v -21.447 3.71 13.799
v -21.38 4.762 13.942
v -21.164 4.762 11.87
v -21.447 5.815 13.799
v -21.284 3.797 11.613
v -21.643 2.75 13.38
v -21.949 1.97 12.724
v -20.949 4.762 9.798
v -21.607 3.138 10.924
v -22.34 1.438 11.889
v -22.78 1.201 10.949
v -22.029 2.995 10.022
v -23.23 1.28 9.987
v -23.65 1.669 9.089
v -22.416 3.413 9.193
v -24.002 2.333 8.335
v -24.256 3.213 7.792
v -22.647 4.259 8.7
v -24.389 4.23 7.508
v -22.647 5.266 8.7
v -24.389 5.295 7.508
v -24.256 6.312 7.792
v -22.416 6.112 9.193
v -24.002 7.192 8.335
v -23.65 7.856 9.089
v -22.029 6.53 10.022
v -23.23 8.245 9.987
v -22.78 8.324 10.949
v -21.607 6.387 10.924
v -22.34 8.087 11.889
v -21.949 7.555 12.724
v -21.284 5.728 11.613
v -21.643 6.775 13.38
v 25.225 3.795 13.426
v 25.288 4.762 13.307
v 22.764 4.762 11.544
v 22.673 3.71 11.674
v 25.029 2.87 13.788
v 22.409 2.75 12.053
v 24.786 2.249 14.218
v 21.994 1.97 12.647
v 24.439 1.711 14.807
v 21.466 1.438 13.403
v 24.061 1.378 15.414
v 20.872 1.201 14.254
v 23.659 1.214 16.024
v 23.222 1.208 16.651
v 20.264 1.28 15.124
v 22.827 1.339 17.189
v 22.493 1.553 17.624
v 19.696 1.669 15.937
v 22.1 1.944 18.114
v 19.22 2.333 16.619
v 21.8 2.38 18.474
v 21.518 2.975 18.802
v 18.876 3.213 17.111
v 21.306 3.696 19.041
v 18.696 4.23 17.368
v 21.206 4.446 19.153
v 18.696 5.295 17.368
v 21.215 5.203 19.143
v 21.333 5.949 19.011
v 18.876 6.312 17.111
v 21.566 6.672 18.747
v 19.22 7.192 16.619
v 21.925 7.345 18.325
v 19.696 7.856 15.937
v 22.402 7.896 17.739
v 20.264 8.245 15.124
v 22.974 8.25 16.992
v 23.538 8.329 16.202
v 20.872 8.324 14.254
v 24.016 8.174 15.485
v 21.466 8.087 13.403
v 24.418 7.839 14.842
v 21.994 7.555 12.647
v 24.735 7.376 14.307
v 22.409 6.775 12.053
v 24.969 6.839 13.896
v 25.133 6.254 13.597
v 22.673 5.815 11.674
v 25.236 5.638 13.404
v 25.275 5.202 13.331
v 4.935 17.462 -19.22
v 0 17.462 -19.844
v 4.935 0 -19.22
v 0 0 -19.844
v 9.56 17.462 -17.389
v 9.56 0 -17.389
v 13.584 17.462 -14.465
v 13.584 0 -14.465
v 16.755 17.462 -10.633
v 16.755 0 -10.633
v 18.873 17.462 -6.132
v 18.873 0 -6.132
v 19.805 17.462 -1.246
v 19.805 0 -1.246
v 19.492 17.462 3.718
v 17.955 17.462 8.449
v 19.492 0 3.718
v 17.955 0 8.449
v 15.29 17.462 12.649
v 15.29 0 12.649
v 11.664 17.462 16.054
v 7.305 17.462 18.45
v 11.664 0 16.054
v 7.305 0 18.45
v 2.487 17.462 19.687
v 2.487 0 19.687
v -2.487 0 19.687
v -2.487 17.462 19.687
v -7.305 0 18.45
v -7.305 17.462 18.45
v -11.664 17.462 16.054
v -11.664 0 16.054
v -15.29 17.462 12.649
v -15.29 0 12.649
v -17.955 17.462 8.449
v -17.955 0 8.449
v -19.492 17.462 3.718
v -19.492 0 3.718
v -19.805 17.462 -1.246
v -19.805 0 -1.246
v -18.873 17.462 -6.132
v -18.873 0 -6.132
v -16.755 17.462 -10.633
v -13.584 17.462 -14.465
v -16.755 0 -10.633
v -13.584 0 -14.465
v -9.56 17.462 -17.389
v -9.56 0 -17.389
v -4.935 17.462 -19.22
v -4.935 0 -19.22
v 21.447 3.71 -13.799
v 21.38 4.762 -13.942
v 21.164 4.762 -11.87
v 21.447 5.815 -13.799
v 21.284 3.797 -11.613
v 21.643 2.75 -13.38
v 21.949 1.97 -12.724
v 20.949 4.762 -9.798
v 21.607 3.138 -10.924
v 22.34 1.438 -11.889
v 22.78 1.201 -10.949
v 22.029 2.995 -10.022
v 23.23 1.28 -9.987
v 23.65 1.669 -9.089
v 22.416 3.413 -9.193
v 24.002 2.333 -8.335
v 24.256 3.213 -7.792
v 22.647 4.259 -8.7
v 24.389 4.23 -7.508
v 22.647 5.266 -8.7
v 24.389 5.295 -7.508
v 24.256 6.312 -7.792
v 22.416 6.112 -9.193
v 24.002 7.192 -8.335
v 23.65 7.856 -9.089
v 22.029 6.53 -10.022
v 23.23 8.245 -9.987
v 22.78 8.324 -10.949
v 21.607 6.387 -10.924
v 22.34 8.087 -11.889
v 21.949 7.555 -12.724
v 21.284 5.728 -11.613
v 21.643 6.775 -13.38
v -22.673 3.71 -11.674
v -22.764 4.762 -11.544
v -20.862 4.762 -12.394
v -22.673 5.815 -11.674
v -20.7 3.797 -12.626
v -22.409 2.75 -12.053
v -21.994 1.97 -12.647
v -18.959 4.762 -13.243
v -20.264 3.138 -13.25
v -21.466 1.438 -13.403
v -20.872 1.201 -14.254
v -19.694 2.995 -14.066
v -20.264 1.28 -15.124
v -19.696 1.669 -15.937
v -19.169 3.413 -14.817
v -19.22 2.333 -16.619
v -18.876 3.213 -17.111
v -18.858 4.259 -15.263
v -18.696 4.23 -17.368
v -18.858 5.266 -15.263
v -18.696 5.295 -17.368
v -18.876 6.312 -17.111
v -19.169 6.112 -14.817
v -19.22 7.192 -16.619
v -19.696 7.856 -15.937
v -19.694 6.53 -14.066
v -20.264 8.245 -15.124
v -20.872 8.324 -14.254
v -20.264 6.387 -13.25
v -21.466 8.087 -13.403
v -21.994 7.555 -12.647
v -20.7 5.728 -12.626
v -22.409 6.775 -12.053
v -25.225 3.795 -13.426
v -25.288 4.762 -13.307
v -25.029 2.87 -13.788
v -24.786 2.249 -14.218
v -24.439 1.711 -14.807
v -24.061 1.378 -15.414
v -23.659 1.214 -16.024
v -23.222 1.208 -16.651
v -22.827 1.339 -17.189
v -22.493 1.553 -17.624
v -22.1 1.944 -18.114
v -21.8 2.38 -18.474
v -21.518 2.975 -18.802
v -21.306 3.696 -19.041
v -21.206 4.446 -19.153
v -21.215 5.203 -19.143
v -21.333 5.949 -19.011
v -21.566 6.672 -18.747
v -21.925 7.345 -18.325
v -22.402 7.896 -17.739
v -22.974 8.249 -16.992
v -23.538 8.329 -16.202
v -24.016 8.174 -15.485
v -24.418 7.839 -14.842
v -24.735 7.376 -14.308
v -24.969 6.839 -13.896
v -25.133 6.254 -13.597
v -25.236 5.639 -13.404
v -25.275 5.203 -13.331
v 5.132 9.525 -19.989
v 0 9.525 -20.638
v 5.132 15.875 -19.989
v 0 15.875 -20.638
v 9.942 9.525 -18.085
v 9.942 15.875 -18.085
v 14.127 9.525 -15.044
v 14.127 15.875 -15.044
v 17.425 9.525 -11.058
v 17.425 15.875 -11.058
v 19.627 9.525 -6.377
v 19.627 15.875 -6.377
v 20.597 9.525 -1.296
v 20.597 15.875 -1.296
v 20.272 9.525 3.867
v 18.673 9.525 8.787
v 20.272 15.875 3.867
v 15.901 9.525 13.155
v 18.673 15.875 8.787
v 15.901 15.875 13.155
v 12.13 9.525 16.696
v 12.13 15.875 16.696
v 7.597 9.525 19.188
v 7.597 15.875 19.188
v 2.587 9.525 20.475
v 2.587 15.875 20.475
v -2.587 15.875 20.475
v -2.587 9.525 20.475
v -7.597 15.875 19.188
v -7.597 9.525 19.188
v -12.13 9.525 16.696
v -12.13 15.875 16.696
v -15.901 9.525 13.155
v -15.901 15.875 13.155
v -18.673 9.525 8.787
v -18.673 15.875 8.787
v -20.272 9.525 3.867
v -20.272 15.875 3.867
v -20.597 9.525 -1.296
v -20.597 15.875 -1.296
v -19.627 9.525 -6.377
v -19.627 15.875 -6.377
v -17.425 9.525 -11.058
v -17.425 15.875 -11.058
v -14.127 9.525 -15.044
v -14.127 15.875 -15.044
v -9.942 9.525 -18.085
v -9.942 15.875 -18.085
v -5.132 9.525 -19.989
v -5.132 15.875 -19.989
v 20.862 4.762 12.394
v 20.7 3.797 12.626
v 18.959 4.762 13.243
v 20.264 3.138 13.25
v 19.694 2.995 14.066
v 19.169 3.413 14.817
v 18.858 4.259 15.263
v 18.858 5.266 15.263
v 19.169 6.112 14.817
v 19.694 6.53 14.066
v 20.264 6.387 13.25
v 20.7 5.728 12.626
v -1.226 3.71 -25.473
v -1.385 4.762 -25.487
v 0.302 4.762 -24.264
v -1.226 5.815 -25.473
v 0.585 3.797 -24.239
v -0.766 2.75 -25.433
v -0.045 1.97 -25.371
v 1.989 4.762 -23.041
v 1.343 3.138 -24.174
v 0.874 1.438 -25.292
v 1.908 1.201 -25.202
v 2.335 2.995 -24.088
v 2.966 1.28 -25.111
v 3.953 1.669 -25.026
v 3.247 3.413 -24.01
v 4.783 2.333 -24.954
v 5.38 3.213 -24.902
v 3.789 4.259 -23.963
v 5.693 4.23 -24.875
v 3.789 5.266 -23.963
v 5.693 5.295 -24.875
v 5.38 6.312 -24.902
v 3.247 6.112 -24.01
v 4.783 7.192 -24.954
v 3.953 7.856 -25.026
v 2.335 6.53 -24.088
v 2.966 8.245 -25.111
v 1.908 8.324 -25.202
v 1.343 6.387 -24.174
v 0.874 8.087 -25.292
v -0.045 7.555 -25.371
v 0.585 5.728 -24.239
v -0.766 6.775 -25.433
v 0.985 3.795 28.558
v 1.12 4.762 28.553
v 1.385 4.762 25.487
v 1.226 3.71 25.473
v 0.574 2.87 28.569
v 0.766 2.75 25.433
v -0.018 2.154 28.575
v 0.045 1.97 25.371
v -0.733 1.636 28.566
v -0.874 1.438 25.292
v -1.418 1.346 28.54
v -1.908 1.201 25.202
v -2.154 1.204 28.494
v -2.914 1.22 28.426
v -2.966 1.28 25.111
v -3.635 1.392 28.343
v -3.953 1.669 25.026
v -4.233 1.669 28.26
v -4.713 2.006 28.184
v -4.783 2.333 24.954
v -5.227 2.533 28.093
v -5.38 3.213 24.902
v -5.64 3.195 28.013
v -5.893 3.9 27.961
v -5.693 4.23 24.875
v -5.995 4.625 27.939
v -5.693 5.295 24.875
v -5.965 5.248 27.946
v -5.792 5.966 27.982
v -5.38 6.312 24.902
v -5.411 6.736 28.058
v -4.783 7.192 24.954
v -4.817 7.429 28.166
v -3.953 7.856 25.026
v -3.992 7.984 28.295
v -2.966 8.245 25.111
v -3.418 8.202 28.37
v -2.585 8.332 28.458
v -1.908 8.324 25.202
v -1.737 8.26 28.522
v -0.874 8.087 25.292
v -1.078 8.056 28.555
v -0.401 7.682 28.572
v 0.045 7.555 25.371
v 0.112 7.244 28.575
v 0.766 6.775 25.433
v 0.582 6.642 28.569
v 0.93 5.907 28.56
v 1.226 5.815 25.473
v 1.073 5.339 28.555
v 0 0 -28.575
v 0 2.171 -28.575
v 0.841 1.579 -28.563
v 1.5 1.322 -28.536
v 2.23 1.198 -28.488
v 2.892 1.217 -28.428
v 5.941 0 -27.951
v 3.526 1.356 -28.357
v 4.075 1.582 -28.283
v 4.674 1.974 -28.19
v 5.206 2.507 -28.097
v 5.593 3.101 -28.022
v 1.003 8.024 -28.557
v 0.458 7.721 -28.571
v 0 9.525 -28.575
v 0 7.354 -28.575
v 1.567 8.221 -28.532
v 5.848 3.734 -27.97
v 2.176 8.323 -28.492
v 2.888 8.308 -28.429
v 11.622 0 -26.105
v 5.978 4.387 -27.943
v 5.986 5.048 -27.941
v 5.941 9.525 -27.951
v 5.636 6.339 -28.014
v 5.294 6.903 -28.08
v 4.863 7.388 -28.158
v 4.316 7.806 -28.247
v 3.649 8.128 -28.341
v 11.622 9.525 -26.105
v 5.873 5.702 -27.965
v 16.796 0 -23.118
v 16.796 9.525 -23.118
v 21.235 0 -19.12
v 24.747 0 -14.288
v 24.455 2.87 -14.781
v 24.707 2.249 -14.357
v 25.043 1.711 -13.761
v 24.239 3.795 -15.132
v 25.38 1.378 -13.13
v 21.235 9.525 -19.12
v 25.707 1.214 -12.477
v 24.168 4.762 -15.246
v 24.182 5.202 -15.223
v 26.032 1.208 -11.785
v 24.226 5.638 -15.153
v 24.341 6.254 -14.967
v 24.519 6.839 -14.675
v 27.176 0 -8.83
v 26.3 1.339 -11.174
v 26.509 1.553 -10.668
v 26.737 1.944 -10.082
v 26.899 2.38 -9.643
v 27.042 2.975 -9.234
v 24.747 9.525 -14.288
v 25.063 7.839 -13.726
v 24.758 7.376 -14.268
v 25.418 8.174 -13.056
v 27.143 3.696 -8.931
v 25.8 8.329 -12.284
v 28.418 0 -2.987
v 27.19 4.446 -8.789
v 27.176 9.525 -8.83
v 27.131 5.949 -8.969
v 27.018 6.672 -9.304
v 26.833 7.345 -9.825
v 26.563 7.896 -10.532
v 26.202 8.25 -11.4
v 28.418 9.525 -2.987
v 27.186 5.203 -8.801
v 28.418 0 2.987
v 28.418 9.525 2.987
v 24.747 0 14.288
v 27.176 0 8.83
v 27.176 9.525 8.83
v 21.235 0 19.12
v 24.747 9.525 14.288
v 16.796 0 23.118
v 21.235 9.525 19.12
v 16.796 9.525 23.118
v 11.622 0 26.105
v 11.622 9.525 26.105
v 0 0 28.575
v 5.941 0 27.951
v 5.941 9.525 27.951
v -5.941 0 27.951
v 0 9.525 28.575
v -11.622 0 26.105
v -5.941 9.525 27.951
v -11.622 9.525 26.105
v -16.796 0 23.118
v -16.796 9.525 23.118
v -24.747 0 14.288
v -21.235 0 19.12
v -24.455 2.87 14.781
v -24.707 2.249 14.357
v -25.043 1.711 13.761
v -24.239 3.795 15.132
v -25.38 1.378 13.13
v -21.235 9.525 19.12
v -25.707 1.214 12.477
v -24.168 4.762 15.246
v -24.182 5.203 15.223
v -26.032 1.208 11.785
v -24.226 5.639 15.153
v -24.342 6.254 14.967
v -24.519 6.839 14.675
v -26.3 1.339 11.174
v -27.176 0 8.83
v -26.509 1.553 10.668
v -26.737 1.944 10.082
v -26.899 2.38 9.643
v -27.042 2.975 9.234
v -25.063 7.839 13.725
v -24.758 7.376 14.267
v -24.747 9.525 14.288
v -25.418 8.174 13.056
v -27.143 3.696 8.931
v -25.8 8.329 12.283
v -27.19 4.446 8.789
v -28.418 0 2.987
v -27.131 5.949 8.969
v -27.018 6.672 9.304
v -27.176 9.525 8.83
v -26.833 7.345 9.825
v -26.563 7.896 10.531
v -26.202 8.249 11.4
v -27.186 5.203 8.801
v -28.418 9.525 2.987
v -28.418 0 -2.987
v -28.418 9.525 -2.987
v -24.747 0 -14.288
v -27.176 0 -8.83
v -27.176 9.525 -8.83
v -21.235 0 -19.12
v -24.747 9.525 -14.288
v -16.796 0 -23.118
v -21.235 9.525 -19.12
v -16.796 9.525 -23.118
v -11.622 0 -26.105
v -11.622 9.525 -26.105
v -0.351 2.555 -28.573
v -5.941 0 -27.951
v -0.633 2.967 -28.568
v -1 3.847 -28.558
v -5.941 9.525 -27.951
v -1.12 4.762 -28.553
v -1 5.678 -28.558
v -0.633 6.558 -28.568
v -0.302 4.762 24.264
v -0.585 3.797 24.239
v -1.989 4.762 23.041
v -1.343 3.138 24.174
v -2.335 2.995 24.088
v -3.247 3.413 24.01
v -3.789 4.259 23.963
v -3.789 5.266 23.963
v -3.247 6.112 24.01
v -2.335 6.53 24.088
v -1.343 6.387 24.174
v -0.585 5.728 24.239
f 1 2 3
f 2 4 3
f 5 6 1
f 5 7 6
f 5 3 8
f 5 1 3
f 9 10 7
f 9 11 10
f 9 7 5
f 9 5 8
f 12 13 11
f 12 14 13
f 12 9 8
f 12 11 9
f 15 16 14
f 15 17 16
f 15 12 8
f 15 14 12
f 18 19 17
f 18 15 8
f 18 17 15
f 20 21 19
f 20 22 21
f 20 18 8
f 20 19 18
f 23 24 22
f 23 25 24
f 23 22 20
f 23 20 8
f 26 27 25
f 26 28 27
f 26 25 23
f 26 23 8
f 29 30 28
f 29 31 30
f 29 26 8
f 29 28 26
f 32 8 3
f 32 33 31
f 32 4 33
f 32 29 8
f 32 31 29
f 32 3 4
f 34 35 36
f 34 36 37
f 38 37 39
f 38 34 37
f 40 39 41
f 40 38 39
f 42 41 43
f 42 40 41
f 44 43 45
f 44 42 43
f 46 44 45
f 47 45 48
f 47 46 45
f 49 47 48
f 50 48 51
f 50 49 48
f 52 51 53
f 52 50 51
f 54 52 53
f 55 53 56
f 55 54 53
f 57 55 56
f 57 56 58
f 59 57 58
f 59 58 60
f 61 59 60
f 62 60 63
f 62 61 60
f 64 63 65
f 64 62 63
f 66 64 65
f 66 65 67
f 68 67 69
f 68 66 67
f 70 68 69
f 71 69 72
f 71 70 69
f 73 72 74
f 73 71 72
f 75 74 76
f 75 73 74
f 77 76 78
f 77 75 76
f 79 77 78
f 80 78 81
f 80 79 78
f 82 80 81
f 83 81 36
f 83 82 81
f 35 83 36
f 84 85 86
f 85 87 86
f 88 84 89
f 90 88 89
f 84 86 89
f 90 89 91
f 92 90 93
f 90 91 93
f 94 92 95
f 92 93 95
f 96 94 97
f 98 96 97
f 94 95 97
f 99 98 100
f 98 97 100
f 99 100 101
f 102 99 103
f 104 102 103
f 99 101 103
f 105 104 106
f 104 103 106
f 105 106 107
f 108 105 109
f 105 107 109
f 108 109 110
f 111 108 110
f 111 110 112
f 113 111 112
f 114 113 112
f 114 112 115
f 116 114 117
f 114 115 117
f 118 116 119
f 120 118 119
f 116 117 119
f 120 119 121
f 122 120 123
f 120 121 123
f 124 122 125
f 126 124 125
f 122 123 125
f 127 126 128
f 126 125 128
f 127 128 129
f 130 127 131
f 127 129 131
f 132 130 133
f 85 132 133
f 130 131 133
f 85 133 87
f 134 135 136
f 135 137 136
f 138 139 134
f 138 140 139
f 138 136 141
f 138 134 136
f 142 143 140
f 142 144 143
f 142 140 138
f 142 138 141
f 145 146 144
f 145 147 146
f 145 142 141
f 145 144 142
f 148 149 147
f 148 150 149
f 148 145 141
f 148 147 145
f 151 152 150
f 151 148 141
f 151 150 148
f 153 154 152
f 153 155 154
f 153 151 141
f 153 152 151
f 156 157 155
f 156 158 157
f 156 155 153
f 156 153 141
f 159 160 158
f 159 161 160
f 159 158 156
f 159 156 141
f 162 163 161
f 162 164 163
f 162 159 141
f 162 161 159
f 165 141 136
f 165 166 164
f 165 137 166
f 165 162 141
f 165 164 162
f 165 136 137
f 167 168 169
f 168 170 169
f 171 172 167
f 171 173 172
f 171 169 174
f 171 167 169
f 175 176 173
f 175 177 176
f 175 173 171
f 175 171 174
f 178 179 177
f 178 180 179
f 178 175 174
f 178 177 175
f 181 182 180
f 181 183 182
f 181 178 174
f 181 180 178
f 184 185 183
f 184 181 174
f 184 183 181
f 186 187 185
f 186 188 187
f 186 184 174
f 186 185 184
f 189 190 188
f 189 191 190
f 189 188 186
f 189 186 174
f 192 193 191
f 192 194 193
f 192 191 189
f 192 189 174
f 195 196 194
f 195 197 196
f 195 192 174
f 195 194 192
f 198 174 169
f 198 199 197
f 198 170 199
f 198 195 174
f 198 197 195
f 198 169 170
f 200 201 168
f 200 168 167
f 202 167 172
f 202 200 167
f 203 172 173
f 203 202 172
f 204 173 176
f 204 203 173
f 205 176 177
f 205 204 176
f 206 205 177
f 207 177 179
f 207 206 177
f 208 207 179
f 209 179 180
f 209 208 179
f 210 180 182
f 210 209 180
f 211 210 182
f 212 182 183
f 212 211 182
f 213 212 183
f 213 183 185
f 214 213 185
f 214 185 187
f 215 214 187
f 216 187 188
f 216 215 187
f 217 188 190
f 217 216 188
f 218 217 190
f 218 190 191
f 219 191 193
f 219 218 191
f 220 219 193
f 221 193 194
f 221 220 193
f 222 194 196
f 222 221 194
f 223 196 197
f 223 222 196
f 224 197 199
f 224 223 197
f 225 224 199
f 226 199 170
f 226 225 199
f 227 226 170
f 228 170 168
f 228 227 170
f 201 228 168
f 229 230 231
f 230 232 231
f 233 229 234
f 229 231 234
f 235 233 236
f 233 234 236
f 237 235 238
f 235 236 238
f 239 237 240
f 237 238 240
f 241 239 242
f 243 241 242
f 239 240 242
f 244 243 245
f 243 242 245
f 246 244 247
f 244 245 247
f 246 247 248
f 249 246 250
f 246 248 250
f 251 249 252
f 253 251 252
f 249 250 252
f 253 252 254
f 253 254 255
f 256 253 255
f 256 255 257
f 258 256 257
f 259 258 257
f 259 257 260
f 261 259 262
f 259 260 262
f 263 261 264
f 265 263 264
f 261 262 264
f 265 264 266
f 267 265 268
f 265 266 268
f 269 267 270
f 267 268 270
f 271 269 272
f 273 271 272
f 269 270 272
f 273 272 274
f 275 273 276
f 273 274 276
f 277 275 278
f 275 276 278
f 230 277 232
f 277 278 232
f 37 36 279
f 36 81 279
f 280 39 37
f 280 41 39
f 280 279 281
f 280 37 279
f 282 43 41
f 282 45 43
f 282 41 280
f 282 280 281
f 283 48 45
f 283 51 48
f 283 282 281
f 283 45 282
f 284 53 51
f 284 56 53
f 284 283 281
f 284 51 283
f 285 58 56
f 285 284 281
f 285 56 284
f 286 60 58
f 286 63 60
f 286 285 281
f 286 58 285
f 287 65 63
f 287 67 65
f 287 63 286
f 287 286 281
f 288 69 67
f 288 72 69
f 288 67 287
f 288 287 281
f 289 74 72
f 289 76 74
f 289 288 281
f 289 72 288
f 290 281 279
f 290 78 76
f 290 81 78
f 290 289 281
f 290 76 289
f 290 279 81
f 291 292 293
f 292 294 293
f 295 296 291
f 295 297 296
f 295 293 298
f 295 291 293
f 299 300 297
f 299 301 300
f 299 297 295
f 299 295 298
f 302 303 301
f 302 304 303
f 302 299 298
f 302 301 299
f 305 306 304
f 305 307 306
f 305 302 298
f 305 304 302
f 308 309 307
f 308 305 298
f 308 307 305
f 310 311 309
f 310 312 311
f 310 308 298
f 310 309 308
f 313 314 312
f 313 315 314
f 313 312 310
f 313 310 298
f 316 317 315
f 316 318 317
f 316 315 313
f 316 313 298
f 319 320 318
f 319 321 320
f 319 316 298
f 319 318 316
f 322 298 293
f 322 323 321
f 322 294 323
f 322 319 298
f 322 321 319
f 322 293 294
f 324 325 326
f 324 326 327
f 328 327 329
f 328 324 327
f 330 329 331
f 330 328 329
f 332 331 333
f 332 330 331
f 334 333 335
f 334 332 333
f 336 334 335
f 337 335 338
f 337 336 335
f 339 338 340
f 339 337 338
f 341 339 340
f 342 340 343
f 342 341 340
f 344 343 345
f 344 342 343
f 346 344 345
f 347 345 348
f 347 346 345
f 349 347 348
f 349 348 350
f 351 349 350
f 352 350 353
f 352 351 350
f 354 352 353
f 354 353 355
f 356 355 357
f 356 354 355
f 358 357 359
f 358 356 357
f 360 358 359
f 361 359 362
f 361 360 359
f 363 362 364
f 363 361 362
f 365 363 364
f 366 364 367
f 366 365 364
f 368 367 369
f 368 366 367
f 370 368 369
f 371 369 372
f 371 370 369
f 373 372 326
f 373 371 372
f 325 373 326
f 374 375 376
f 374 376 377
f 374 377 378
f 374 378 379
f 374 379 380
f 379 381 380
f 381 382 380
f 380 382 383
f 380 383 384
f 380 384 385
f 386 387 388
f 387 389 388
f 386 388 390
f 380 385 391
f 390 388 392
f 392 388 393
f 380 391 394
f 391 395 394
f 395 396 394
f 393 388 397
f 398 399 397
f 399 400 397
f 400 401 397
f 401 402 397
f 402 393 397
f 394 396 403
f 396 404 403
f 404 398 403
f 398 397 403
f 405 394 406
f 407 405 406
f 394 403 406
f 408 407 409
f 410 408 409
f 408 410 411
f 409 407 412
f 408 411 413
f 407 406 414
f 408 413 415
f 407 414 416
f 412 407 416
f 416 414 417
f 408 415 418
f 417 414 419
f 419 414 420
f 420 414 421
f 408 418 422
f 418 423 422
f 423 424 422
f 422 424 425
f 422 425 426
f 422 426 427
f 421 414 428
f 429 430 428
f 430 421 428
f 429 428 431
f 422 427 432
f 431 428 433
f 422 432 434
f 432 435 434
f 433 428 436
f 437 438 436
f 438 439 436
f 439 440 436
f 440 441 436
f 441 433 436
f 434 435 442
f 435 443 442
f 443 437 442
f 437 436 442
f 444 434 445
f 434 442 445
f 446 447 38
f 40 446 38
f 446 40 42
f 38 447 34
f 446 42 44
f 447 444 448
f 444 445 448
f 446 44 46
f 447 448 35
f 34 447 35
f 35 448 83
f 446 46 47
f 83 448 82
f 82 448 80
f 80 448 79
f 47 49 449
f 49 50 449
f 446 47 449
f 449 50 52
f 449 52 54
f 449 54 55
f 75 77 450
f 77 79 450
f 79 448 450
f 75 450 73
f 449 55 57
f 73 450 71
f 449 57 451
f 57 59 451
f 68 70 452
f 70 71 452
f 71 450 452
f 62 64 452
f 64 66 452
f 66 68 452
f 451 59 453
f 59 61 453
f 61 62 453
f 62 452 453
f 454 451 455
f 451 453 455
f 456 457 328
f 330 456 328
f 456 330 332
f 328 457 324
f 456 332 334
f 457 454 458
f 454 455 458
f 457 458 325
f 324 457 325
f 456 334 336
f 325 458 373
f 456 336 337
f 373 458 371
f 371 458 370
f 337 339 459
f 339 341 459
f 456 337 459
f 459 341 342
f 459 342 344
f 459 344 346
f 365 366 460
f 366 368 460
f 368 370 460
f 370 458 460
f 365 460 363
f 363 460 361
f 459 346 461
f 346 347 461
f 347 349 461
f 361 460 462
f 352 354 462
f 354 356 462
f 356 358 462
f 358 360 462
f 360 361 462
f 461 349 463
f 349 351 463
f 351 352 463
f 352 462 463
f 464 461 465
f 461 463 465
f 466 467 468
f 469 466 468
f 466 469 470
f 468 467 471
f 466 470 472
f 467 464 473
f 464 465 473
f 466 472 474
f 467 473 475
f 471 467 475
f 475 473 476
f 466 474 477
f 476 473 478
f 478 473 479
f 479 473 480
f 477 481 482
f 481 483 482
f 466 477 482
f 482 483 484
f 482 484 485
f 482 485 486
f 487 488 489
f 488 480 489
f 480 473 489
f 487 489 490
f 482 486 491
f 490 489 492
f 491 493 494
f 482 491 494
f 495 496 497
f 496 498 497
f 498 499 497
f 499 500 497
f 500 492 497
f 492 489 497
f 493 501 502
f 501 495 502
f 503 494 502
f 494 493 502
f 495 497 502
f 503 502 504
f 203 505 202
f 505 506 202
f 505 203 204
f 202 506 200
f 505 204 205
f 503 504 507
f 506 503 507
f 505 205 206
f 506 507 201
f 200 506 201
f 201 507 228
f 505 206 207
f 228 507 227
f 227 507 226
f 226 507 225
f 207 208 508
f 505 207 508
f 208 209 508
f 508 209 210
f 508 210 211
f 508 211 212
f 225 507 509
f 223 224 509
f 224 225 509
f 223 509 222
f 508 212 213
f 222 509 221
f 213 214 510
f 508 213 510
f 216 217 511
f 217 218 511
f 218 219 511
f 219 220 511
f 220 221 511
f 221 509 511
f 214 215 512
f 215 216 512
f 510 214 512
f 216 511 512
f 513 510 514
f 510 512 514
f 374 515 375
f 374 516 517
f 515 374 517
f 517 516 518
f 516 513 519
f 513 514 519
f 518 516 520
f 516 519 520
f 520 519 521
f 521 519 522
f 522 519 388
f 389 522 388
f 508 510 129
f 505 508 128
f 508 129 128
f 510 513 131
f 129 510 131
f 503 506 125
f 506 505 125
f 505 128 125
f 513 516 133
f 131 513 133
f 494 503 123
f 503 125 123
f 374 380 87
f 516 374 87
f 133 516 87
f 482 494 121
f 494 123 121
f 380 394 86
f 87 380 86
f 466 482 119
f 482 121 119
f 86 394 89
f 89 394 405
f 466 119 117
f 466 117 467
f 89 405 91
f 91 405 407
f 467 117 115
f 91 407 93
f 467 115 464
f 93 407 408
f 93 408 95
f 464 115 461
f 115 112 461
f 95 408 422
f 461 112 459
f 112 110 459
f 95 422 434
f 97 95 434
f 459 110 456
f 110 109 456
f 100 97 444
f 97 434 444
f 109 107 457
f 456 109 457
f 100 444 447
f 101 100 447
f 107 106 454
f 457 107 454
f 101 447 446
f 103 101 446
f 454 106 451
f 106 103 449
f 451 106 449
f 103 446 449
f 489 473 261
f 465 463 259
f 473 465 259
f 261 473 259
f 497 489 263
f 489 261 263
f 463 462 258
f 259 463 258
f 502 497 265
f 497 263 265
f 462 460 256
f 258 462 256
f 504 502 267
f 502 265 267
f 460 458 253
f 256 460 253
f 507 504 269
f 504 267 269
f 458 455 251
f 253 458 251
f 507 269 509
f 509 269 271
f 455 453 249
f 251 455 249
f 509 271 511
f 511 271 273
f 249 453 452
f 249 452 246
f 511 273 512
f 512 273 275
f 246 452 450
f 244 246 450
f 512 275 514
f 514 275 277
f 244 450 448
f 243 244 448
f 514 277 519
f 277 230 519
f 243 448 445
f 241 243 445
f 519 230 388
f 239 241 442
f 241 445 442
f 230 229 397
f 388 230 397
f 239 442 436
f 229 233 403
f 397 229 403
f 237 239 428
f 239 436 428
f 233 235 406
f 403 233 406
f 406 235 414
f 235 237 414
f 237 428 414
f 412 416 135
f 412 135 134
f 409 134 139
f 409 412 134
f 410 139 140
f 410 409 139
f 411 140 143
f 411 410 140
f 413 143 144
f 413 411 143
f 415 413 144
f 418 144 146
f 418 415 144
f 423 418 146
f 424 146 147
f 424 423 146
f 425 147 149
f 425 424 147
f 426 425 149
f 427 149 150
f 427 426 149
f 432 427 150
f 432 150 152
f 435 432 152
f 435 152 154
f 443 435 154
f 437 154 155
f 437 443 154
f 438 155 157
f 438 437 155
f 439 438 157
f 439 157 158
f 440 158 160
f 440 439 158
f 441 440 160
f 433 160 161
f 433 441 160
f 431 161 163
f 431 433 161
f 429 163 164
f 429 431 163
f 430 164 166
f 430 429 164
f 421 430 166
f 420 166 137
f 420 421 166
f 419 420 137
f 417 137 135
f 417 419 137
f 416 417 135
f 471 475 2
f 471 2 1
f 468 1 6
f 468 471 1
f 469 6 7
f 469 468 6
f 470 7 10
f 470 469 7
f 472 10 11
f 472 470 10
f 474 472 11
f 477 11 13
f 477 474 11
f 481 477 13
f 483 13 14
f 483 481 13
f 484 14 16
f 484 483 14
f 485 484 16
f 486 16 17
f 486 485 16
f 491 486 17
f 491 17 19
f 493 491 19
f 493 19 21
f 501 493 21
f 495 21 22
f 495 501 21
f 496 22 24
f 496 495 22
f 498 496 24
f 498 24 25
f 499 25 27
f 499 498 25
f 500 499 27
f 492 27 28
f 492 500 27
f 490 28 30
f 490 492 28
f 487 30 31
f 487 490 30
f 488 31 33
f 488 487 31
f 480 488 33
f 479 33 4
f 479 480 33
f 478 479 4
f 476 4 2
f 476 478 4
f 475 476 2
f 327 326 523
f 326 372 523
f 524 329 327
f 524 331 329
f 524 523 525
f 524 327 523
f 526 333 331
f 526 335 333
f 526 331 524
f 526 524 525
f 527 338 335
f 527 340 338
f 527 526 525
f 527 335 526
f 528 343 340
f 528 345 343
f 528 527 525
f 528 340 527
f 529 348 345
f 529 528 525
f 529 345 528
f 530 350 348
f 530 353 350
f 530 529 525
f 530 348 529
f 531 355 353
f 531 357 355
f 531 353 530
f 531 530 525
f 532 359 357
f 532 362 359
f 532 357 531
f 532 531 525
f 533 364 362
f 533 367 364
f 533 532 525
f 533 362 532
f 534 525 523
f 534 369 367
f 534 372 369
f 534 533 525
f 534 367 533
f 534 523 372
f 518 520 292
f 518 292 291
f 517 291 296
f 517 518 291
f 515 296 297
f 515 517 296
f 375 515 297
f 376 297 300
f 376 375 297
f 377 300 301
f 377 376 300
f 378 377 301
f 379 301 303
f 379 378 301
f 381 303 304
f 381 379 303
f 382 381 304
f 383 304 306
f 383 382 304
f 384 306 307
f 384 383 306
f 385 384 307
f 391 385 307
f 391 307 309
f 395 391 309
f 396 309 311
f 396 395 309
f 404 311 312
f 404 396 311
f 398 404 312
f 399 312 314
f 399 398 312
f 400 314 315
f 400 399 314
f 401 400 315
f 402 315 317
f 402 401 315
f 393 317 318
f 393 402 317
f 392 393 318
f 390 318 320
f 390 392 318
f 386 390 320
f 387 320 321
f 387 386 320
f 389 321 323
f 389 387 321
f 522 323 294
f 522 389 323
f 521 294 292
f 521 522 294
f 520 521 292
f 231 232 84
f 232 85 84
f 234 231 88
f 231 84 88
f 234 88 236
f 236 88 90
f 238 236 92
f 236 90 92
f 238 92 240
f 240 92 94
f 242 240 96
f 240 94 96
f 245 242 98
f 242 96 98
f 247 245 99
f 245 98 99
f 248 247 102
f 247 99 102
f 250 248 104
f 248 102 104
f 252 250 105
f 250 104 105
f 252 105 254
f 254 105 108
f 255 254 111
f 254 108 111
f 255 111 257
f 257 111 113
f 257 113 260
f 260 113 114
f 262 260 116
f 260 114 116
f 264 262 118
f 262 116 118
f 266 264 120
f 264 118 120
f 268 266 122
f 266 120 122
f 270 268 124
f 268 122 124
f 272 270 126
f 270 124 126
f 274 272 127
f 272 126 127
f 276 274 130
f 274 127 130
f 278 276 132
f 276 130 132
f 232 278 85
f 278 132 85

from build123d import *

# Parameters (mm, degrees)
CIRPATTERN1_COUNT = 6


with BuildPart() as part:
    # Sketch1 → Revolve1 (revolve)
    with BuildSketch(Plane(origin=(0, 0, 0), x_dir=(0, 0, -1), z_dir=(1, 0, 0))):
        Polygon((19.84375, 0), (28.575, 0), (28.575, 9.525), (20.6375, 9.525), (20.6375, 15.875), (19.84375, 17.4625), align=None)
    revolve(axis=Axis((0, 73.584156028, 0), (0, -1, 0)))

    # Sketch2 → 9/32 (0.28125) Diameter Hole1 (revolve, cut)
    with BuildSketch(Plane(origin=(23.425888069, 4.7625, 16.363324637), x_dir=(0.572644782, 0, -0.819803607), z_dir=(0, 1, 0))):
        Polygon((0, 0), (0, 5.448199024), (3.571875, 3.302), (3.571875, 0), align=None)
    f_9_32_0_28125_diameter_hole1 = revolve(axis=Axis((28.631640973, 4.7625, 19.999619001), (-0.819803607, 0, -0.572644782)), mode=Mode.SUBTRACT)

    # CirPattern1: 9/32 (0.28125) Diameter Hole1 ×6 about axis
    cirpattern1_axis = Axis((0, 73.584156028, 0), (0, 1, 0))
    for i in range(1, CIRPATTERN1_COUNT):
        add(f_9_32_0_28125_diameter_hole1.rotate(cirpattern1_axis, i * 360 / CIRPATTERN1_COUNT), mode=Mode.SUBTRACT)


solid = part.part
